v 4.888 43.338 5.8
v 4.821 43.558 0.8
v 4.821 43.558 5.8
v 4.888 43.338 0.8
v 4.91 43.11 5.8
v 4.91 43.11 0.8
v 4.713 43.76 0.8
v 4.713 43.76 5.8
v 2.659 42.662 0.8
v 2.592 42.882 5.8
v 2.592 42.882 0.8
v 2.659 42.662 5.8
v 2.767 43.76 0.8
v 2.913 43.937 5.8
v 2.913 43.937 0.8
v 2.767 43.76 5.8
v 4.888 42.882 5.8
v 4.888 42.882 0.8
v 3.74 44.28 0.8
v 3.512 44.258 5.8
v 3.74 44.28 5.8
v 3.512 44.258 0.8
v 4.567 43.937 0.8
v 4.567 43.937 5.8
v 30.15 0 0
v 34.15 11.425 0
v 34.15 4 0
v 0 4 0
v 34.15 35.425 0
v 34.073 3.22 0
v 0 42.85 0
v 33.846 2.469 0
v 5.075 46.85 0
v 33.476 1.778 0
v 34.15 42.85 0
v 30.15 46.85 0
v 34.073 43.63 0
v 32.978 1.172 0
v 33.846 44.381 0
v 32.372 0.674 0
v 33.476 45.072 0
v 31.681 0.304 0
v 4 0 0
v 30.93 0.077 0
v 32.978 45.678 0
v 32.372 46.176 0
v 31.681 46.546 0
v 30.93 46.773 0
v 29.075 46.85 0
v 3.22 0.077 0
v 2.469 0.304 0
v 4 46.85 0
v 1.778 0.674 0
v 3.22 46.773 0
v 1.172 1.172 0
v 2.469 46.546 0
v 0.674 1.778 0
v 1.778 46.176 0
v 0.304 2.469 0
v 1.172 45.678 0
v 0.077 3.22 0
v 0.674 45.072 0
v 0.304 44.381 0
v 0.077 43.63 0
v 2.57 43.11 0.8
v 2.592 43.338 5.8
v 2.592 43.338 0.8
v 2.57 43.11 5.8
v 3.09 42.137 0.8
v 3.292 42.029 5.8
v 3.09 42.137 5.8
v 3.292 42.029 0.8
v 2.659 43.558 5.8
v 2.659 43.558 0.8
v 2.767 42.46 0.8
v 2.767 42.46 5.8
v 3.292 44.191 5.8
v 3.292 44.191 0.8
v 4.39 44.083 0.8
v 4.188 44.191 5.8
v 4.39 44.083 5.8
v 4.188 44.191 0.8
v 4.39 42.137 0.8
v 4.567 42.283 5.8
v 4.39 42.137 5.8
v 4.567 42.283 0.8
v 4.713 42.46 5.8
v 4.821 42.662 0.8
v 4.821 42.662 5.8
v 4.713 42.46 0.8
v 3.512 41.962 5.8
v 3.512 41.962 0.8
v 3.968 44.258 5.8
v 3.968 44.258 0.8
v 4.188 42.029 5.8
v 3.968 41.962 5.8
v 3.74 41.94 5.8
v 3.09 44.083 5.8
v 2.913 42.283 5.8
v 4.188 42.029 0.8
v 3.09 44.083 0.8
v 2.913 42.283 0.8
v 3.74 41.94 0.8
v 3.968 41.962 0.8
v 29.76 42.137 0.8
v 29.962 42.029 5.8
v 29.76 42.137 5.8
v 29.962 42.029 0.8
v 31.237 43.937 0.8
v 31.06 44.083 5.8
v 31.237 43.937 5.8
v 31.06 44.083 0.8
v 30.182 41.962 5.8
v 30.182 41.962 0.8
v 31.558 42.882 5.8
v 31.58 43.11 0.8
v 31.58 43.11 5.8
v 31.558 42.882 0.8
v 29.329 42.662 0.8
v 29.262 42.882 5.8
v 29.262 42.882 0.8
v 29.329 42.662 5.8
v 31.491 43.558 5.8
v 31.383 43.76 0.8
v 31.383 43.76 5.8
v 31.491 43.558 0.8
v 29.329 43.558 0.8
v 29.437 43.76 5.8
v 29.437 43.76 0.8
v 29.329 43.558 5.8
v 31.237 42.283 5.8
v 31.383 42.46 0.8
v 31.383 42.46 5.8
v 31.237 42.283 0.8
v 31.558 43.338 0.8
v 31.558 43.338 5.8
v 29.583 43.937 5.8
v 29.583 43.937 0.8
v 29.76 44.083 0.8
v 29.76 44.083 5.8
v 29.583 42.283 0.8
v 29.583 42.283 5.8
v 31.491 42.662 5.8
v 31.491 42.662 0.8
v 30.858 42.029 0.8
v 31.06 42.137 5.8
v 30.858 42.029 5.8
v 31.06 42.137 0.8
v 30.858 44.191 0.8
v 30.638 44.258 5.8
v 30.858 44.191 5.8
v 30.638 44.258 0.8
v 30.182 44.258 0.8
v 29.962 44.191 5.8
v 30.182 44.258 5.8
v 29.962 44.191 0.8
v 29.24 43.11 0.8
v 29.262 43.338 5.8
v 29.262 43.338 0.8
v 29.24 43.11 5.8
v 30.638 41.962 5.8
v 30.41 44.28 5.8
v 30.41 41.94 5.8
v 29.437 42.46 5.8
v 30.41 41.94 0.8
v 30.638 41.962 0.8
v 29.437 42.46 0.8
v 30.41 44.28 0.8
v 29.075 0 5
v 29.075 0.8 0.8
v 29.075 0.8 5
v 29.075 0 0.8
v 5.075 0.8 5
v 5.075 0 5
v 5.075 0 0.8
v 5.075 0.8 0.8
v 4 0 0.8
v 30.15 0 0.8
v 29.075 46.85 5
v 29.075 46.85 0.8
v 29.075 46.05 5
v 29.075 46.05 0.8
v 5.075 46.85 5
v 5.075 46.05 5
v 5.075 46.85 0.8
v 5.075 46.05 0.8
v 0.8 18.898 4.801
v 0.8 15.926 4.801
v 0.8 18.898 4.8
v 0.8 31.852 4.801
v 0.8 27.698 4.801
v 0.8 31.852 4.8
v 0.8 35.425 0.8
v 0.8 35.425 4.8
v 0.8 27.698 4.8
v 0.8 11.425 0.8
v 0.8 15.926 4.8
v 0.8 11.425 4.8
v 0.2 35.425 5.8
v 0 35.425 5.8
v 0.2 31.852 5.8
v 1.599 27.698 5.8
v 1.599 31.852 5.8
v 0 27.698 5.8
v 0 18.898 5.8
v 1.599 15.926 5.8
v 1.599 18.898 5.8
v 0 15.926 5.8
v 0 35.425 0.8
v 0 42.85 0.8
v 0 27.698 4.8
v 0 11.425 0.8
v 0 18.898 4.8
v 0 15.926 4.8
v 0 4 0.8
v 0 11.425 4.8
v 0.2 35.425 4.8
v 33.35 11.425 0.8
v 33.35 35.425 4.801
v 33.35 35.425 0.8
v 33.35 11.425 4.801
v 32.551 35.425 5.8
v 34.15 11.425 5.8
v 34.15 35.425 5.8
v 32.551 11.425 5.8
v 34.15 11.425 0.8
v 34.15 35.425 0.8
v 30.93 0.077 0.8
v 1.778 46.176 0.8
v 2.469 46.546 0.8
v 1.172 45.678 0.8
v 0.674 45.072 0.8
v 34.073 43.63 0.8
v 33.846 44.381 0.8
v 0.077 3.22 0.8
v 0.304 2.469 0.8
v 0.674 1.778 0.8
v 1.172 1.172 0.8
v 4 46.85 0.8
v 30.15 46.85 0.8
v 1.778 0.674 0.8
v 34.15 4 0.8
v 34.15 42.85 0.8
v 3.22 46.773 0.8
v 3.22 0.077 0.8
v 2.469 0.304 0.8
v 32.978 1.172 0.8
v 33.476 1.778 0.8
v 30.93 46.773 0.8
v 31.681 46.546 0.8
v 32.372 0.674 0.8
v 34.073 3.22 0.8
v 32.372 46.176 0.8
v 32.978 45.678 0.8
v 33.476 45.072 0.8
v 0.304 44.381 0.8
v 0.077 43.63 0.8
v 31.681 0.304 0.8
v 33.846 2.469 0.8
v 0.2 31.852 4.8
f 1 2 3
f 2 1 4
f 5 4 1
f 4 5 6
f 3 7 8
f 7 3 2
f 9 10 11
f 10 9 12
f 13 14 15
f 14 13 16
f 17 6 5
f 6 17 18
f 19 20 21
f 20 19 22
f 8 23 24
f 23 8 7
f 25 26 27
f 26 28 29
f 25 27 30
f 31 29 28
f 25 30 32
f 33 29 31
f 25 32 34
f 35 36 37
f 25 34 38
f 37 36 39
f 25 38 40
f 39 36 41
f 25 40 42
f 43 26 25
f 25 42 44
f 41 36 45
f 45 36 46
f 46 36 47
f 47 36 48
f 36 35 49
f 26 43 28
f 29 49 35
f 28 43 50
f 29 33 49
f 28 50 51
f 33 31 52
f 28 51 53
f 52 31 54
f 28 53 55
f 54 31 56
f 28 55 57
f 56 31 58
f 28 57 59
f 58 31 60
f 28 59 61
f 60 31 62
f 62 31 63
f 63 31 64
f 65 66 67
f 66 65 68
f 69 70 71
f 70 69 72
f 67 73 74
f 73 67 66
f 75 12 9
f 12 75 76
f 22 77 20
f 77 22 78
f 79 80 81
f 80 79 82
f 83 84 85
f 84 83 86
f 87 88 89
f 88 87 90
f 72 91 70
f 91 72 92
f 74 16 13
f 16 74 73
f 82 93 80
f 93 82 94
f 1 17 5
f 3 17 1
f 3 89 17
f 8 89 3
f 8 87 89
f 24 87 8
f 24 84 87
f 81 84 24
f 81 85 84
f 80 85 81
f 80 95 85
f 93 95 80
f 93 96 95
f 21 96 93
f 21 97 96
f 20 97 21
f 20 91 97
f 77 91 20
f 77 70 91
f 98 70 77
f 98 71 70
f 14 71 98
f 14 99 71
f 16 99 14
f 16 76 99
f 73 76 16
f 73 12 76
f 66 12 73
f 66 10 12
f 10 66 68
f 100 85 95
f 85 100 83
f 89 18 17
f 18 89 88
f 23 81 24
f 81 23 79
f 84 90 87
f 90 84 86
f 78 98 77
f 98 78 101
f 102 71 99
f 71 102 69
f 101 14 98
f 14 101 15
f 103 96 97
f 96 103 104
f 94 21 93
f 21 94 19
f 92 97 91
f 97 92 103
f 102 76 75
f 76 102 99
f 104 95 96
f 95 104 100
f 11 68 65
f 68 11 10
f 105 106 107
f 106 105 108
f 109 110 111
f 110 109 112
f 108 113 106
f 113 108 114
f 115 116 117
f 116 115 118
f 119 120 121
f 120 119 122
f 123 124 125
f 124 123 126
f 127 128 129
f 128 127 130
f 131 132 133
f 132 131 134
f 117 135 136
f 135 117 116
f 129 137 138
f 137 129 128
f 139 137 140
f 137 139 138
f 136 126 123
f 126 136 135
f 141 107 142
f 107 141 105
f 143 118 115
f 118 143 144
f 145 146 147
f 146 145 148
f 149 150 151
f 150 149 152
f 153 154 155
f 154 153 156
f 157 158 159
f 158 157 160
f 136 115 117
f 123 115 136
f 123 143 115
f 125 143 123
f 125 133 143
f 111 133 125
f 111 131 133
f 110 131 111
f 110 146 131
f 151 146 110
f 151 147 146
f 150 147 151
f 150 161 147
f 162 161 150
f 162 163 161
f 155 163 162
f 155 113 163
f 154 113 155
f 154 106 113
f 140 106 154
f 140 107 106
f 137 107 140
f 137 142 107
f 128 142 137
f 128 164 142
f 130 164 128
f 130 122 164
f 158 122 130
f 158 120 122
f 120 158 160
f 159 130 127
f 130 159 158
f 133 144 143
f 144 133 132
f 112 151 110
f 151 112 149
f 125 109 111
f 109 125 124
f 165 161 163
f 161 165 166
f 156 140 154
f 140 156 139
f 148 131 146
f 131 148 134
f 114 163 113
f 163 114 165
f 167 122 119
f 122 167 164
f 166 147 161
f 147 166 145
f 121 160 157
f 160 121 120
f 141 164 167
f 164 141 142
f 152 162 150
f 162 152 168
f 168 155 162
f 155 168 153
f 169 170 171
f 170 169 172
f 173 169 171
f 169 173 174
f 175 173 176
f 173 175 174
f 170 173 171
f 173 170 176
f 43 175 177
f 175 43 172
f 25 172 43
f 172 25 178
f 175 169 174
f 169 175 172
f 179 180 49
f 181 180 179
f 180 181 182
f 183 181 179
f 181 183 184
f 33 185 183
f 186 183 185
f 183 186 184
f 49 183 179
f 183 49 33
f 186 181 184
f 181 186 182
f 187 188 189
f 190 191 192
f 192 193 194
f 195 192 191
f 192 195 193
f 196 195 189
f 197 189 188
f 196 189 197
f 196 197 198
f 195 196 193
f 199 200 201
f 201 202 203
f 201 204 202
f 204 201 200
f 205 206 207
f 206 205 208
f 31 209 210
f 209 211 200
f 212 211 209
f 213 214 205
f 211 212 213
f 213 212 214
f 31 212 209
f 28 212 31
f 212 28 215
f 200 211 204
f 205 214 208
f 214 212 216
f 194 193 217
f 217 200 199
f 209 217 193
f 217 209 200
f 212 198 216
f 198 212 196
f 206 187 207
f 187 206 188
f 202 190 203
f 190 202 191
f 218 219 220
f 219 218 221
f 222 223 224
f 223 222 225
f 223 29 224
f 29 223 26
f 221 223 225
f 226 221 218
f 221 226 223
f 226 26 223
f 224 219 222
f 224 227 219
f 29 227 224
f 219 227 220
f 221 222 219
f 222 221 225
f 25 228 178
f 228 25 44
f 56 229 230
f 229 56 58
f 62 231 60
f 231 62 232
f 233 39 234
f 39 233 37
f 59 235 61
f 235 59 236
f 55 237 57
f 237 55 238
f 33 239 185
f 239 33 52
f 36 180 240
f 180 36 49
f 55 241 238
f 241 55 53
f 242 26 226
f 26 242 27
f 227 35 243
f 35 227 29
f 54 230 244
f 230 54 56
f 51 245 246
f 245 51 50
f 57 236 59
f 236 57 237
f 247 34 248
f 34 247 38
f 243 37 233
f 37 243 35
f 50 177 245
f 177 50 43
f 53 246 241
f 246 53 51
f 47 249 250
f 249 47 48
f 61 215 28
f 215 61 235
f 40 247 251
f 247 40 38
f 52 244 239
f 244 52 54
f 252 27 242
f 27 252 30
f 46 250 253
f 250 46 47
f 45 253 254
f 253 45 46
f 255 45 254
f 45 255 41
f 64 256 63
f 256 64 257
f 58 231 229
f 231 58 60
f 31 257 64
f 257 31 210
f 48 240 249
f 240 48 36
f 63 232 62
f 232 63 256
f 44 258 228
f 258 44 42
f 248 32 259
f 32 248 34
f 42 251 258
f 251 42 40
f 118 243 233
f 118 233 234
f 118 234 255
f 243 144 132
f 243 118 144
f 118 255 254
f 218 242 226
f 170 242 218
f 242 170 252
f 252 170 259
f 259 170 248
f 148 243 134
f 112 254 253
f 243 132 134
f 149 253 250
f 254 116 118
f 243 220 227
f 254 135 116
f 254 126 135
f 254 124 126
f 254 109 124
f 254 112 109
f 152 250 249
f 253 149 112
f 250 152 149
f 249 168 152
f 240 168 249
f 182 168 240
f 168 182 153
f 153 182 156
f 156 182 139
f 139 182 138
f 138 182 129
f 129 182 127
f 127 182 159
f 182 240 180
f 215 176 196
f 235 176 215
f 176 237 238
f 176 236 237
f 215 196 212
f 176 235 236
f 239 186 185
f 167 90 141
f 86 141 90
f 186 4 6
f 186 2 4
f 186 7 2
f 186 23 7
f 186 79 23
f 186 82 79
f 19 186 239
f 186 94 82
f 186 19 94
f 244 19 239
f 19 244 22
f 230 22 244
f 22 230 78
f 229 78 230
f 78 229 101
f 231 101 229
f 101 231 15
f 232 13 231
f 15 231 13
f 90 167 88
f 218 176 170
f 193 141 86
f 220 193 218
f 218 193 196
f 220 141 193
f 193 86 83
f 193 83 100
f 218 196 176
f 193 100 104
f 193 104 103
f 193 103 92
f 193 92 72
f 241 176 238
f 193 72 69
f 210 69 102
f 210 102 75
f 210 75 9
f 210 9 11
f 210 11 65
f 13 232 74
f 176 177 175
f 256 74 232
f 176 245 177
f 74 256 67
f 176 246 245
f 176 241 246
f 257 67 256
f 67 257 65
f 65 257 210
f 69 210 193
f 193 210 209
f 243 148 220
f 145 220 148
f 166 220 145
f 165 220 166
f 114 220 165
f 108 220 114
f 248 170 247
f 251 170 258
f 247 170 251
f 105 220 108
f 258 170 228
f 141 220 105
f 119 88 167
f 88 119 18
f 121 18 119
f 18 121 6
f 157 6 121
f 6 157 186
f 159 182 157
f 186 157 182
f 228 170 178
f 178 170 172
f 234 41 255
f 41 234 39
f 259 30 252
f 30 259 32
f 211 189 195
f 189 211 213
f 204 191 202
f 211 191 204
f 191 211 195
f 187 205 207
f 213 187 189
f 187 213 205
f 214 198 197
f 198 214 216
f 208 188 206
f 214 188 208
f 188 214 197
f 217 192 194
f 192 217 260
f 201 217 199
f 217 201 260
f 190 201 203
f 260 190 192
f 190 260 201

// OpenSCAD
EPSILON = 0.001;

FONA_BASE_WIDTH = 1.25 * 25.4;
FONA_BASE_DEPTH = 1.75 * 25.4;
FONA_BASE_HEIGHT = 1.80;

FONA_SIM_CARD_HOLDER_WIDTH = 18;
FONA_SIM_CARD_HOLDER_DEPTH = 30;
FONA_SIM_CARD_HOLDER_HEIGHT = 2.4;
FONA_SIM_CARD_HOLDER_MARGIN_TOP = 8;

FONA_HOLDER_WALL_THICKNESS = 0.8;
FONA_MARGIN = 0.4;

function Fona_width() = FONA_BASE_WIDTH;
function Fona_depth() = FONA_BASE_DEPTH;

function Fona_holderWidth() = FONA_BASE_WIDTH + 2 * (FONA_HOLDER_WALL_THICKNESS + FONA_MARGIN);
function Fona_holderDepth() = FONA_BASE_DEPTH + 2 * (FONA_HOLDER_WALL_THICKNESS + FONA_MARGIN);

/**
 * Adafruit Fona.
 *
 * @param positiveShape
 *     if true, draw only the positive part of the holder,
 *     if false, draw only the negative part.
 */
module Fona(baseThickness = 0.8, positiveShape = true) {
    // Base
    baseX = FONA_HOLDER_WALL_THICKNESS + FONA_MARGIN;
    baseY = FONA_HOLDER_WALL_THICKNESS + FONA_MARGIN;
    baseZ = baseThickness;
    if (positiveShape) {
        cornerRadius = 0.1 * 25.4;
        translate([baseX, baseY, FONA_SIM_CARD_HOLDER_HEIGHT + baseZ])
            linear_extrude(height = FONA_BASE_HEIGHT)
                offset(r = cornerRadius, $fn = 32)
                    offset(r = -cornerRadius, $fn = 32)
                        square([FONA_BASE_WIDTH, FONA_BASE_DEPTH]);
    }
    
    // Holes
    if (!positiveShape) {
        translate([baseX, baseY + FONA_BASE_DEPTH, FONA_SIM_CARD_HOLDER_HEIGHT - EPSILON + baseZ])
            Fona_holes(FONA_BASE_HEIGHT + 2 * EPSILON, false);
    }
    
    // Connectors
    if (positiveShape) {
        translate([baseX, baseY + FONA_BASE_DEPTH, FONA_SIM_CARD_HOLDER_HEIGHT + FONA_BASE_HEIGHT + baseZ])
            Fona_connectors(false);
    }
    
    // SIM card holder
    if (positiveShape) {
        translate([baseX + FONA_BASE_WIDTH - FONA_SIM_CARD_HOLDER_WIDTH,
                   baseY + FONA_BASE_DEPTH - FONA_SIM_CARD_HOLDER_DEPTH - FONA_SIM_CARD_HOLDER_MARGIN_TOP,
                   baseZ])
            cube([FONA_SIM_CARD_HOLDER_WIDTH, FONA_SIM_CARD_HOLDER_DEPTH, FONA_SIM_CARD_HOLDER_HEIGHT]);
    }
}

/**
 * Fona holder and wall clearance.
 *
 * @param positiveShape
 *     if true, draw only the positive part of the holder,
 *     if false, draw only the negative part.
 */
module Fona_holder(baseThickness = 0.8, positiveShape = true) {
    // Base
    baseWidth = Fona_holderWidth();
    baseDepth = Fona_holderDepth();
    if (positiveShape)
        linear_extrude(height = baseThickness)
            offset(r = 4, $fn = 32)
                offset(r = -4, $fn = 32)
                    square([baseWidth, baseDepth]);
    
    // Pillars
    fonaX = FONA_HOLDER_WALL_THICKNESS + FONA_MARGIN;
    fonaY = FONA_HOLDER_WALL_THICKNESS + FONA_MARGIN;
    fonaBaseZ = FONA_SIM_CARD_HOLDER_HEIGHT + baseThickness;
    if (positiveShape) {
        translate([fonaX, fonaY + FONA_BASE_DEPTH, 0])
            Fona_holes(fonaBaseZ + FONA_BASE_HEIGHT + 0.8, true);
    }
    
    // Top and bottom walls
    if (positiveShape) {
        wallWidth = 24;
        for (y = [0, baseDepth - FONA_HOLDER_WALL_THICKNESS])
            translate([(baseWidth - wallWidth) / 2, y, 0])
                cube([wallWidth, FONA_HOLDER_WALL_THICKNESS, fonaBaseZ + FONA_BASE_HEIGHT]);
    }
    
    // Left and right walls
    if (positiveShape) {
        wallDepth = 24;
        horizontalHolderWidth = FONA_HOLDER_WALL_THICKNESS;
        horizontalHolderHeight = fonaBaseZ + FONA_BASE_HEIGHT + FONA_HOLDER_WALL_THICKNESS;
        wallHeight = fonaBaseZ + FONA_BASE_HEIGHT + horizontalHolderWidth;
        
        for (x = [0, baseWidth])
            translate([x, (baseDepth - wallDepth) / 2 + (x > 0 ? wallDepth : 0), 0])
                rotate([0, 0, x > 0 ? 180 : 0]){
                    cube([FONA_HOLDER_WALL_THICKNESS, wallDepth, wallHeight]);
                
                    translate([horizontalHolderWidth - EPSILON, 0, horizontalHolderHeight])
                        rotate([-90, 0, 0])
                            linear_extrude(height = wallDepth)
                                polygon(points = [[0, 0],
                                                 [horizontalHolderWidth, 0],
                                                 [0, horizontalHolderWidth + 0.2]]);
                }
    }
    
    // Connector clearance
    if (!positiveShape) {
        translate([fonaX, fonaY + FONA_BASE_DEPTH, FONA_BASE_HEIGHT + fonaBaseZ - 0.2]) {
            Fona_connectors(clearance = true, includeJstConnector = false);
            translate([6 - FONA_HOLDER_WALL_THICKNESS - 0.2, 0, 0])
                Fona_connectors(clearance = true, includeJstConnector = true);
        }
    }
}

/**
 * Holes of the FONA.
 *
 * @param positiveShape
 *     if true, draw only the positive part of the holder,
 *     if false, draw only the negative part.
 */
module Fona_holes(height = 10, positiveShape = true) {
    margin = positiveShape ? 0.2 : 0;
    distanceBetweenHoles = 1.05 * 25.4;
    
    for (x = [0, distanceBetweenHoles])
        translate([(FONA_BASE_WIDTH - distanceBetweenHoles) / 2 + x, -0.1 * 25.4])
            cylinder(d = 0.1 * 25.4 - margin, h = height, $fn = 32);
}

/**
 * FONA connectors.
 *
 * @param positiveShape
 *     if true, draw only the positive part of the holder,
 *     if false, draw only the negative part.
 */
module Fona_connectors(clearance = false, includeJstConnector = true) {
    translate([clearance ? -6 : 0, 0, 0]) {
        // 2-pin JST-PH connector
        if (includeJstConnector) {
            distanceBottomJstConnector = 1.38 * 25.4;
            jstConnectorWidth = 8.5;
            jstConnectorHeight = 7.3 - FONA_BASE_HEIGHT;
            translate([jstConnectorWidth / 2, -FONA_BASE_DEPTH + distanceBottomJstConnector, jstConnectorHeight / 2])
                cube(size = [jstConnectorWidth, 8.8, jstConnectorHeight], center = true);
        }
        
        // USB connector
        distanceBottomUsbConnector = 0.87 * 25.4;
        usbConnectorWidth = 6.2;
        usbConnectorHeight = 5.4 - FONA_BASE_HEIGHT;
        translate([usbConnectorWidth / 2, -FONA_BASE_DEPTH + distanceBottomUsbConnector, usbConnectorHeight / 2])
            cube(size = [usbConnectorWidth, 8.8, usbConnectorHeight], center = true);
        
        // Headphone connector
        distanceBottomHeadphoneConnector = 0.44 * 25.4;
        headConnectorWidth = 12.8 + 1.4;
        headConnectorHeight = 7.2 - FONA_BASE_HEIGHT;
        translate([headConnectorWidth / 2 - 1.4, -FONA_BASE_DEPTH + distanceBottomHeadphoneConnector, headConnectorHeight / 2])
            cube(size = [headConnectorWidth, 7.1, headConnectorHeight], center = true);
    }
}
/*
color("dimgray")
difference() {
    Fona(baseThickness = 0.8, positiveShape = true);
    Fona(baseThickness = 0.8, positiveShape = false);
}
*/
difference() {
    Fona_holder(baseThickness = 0.8, positiveShape = true);
    Fona_holder(baseThickness = 0.8, positiveShape = false);
}
